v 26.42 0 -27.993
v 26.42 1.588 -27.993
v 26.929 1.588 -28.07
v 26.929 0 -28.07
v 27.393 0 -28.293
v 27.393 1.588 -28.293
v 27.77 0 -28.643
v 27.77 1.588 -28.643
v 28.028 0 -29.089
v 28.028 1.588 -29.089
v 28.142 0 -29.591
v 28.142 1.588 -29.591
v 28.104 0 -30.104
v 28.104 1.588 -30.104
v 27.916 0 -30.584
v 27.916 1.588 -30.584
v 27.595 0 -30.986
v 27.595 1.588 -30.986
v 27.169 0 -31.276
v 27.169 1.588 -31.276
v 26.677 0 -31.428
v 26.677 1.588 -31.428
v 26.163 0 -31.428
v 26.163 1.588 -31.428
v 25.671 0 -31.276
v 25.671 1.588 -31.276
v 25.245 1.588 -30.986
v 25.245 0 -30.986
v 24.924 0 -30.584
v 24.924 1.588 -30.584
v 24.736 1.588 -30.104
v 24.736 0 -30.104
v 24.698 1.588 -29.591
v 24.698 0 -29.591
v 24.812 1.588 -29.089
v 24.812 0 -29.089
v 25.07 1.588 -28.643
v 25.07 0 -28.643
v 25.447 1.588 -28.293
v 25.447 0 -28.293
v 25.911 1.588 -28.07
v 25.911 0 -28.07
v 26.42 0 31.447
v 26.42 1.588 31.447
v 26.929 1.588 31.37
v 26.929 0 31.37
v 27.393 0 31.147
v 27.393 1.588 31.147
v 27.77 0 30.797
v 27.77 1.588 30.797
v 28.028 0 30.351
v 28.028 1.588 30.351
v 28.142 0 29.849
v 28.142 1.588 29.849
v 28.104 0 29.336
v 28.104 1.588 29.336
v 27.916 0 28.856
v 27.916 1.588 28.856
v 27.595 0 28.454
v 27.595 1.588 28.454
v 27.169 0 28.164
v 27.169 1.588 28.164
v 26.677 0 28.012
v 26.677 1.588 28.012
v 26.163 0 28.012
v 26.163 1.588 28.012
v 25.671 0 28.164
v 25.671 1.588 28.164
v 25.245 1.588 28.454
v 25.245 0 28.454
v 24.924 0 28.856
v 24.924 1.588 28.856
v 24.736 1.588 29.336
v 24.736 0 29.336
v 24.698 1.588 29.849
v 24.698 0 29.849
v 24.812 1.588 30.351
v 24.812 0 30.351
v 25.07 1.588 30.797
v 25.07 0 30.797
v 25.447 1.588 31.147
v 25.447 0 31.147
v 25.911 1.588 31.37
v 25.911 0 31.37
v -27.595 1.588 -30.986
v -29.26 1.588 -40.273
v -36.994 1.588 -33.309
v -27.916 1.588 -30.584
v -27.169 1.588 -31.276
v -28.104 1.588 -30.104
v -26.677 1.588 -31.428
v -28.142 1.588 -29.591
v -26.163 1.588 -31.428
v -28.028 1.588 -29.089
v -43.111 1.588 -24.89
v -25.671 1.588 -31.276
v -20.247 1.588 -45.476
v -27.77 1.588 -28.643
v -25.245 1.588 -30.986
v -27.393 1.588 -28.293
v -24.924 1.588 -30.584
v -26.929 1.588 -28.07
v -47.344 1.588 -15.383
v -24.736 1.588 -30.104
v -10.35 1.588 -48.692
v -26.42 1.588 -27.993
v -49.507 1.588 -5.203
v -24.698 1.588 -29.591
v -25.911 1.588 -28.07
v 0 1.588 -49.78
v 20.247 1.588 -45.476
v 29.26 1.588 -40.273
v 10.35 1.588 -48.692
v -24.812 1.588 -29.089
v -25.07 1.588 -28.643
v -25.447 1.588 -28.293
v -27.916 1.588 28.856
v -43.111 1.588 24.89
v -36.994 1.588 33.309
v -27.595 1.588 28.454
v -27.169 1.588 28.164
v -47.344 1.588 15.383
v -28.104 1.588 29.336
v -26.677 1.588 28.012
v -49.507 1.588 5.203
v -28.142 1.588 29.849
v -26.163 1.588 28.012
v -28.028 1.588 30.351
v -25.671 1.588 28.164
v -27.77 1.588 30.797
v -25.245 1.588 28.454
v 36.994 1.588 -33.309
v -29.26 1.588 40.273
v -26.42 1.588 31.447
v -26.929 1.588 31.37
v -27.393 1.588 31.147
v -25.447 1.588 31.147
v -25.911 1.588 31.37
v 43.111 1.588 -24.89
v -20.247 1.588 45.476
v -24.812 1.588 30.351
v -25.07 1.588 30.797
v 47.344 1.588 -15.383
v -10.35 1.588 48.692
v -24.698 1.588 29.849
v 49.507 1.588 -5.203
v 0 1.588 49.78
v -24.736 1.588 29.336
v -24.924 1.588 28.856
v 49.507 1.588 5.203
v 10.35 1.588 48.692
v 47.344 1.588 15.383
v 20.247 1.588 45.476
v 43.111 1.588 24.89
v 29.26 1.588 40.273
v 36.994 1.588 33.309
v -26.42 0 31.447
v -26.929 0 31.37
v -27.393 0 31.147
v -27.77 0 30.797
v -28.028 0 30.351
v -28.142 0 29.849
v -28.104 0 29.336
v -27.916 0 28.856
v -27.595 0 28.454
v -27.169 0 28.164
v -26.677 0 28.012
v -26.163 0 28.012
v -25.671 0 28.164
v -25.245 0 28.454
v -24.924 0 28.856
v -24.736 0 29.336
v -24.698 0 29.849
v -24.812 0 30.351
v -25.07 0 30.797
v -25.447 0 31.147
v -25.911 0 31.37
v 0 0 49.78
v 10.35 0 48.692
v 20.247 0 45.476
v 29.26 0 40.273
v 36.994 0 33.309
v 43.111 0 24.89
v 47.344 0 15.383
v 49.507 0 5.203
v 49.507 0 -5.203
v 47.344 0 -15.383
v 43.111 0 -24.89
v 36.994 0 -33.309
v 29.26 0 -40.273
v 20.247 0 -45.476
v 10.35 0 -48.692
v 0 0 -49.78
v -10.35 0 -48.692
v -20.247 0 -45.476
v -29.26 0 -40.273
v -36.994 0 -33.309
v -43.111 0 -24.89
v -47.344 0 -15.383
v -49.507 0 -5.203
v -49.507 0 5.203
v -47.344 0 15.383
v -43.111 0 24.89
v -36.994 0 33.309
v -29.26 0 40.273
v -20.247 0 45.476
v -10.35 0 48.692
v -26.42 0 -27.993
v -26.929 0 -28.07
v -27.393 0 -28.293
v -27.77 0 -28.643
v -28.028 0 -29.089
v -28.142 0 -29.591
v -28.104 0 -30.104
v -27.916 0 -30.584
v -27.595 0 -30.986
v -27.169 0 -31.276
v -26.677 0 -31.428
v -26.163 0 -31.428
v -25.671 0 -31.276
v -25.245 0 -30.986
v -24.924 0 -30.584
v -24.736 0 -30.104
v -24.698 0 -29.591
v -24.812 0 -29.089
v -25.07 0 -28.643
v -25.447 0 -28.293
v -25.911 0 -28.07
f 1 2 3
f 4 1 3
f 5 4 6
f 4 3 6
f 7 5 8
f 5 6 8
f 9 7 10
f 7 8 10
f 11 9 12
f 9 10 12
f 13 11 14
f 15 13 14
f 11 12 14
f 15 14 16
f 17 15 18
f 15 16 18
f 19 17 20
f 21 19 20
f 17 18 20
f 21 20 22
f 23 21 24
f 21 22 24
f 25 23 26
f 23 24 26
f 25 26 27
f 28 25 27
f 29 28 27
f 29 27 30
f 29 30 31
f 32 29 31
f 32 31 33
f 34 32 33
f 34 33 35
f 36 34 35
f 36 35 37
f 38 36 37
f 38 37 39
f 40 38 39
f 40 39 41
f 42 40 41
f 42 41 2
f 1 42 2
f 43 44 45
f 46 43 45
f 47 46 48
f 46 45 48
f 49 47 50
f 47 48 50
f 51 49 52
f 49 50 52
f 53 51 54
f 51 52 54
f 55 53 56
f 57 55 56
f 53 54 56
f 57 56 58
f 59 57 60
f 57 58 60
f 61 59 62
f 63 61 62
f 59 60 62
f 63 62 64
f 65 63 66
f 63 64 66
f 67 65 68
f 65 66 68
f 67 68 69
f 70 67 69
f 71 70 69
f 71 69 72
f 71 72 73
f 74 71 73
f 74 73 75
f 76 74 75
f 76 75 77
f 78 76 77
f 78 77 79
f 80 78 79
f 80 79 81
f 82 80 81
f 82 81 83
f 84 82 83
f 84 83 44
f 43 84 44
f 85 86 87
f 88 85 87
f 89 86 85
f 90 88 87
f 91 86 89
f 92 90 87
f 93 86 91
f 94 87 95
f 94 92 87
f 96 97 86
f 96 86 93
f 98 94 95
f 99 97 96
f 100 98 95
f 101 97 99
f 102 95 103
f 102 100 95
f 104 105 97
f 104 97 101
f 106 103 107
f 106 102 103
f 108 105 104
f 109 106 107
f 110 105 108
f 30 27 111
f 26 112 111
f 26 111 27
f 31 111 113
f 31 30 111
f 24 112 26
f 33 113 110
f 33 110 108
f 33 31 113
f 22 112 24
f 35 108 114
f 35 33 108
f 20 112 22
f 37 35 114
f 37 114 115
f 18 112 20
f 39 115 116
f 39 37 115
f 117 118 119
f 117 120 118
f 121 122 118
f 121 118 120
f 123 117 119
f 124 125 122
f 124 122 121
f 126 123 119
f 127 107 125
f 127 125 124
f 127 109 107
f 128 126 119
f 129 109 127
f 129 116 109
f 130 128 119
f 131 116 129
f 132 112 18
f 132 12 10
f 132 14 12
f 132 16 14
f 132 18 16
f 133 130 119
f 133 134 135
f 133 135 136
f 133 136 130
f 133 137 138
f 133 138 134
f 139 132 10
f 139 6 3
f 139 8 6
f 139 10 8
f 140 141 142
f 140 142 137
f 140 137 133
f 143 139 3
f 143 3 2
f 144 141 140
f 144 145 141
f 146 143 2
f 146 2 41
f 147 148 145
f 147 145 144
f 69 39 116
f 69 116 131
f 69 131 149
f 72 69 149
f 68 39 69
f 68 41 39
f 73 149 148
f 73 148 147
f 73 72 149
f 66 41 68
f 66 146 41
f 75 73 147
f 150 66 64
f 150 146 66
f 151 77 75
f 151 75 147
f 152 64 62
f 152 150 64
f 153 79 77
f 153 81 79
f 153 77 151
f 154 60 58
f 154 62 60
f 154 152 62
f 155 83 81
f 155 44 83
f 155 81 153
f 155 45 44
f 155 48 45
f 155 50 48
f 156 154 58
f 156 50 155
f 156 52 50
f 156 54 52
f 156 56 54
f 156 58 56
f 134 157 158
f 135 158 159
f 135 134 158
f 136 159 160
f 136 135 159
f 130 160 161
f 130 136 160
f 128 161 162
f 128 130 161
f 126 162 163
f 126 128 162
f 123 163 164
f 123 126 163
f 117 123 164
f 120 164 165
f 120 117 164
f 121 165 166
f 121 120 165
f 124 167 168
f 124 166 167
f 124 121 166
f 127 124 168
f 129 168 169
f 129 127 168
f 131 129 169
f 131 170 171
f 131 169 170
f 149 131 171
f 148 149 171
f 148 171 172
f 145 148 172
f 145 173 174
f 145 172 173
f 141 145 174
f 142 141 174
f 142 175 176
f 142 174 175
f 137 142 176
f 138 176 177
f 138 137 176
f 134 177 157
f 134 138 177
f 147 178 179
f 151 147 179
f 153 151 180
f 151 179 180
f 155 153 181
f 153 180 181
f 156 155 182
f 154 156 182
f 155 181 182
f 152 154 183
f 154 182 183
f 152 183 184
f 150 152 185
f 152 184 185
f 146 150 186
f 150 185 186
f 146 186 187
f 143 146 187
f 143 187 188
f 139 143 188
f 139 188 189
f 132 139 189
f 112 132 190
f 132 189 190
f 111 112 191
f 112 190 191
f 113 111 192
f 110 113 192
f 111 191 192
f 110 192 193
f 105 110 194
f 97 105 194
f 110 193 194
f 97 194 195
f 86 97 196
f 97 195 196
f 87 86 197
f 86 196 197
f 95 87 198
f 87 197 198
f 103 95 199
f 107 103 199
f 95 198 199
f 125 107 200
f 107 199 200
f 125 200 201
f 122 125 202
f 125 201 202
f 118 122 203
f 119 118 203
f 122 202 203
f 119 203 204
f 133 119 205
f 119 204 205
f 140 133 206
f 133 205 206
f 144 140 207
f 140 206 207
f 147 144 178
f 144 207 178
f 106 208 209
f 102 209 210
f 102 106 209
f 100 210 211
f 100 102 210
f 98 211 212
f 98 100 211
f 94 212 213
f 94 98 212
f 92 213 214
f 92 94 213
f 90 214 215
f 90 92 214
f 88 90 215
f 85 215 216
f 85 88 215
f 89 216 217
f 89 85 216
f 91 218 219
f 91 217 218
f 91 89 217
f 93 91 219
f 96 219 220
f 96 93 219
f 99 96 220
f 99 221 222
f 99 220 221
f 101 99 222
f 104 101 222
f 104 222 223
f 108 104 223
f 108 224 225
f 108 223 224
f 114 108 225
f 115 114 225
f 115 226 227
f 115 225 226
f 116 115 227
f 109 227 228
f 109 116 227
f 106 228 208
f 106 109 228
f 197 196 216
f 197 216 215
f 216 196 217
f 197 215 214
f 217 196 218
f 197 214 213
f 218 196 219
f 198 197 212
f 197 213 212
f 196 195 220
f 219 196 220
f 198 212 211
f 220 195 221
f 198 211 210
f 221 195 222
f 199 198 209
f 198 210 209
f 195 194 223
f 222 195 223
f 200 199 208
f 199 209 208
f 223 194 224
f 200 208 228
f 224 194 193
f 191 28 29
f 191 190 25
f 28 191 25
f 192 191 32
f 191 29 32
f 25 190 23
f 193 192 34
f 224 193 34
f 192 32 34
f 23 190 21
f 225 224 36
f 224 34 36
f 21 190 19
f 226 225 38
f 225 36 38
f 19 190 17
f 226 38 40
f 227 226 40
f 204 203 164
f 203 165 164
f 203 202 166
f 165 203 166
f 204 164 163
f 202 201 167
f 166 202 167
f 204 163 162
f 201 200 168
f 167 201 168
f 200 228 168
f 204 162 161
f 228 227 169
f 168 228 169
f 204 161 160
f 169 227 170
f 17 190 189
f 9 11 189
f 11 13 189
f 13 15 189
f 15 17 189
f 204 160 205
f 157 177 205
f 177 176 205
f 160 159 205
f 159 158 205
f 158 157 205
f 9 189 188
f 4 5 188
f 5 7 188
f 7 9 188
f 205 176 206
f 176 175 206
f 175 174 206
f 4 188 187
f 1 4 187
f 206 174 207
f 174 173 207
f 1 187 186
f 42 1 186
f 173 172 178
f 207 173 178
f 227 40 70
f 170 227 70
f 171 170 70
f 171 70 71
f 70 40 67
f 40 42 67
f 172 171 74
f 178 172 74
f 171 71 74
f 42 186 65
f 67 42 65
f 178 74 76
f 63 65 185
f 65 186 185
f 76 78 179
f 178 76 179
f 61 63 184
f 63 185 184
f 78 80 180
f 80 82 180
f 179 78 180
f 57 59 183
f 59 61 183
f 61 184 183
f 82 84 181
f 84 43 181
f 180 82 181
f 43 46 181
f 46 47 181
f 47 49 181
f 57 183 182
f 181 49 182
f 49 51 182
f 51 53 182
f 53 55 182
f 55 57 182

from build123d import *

# Parameters (mm, degrees)
SKETCH1_R      = 49.78
EXTRUDE1_DEPTH = 1.5875
SKETCH2_R      = 1.7272
EXTRUDE2_DEPTH = 10


with BuildPart() as part:
    # Sketch1 → Extrude1 (new body)
    with BuildSketch(Plane(origin=(0, 0, 0), x_dir=(1, 0, 0), z_dir=(0, 1, 0))):
        with Locations(Location((0, 0, 0), (0, 0, 270))):
            Circle(SKETCH1_R)
    extrude(amount=EXTRUDE1_DEPTH)

    # Sketch2 → Extrude2 (cut)
    with BuildSketch(Plane(origin=(0, 1.5875, 0), x_dir=(-1, 0, 0), z_dir=(0, 1, 0))):
        with Locations(Location((-26.42, -29.72, 0), (0, 0, 90))):
            Circle(SKETCH2_R)
        with Locations(Location((-26.42, 29.72, 0), (0, 0, 90))):
            Circle(SKETCH2_R)
    extrude2 = extrude(amount=-EXTRUDE2_DEPTH, mode=Mode.SUBTRACT)

    # Mirror1: Extrude2 across plane
    add(extrude2.mirror(Plane(origin=(0, 0, 0), x_dir=(0, 0, 1), z_dir=(1, 0, 0))), mode=Mode.SUBTRACT)


solid = part.part
